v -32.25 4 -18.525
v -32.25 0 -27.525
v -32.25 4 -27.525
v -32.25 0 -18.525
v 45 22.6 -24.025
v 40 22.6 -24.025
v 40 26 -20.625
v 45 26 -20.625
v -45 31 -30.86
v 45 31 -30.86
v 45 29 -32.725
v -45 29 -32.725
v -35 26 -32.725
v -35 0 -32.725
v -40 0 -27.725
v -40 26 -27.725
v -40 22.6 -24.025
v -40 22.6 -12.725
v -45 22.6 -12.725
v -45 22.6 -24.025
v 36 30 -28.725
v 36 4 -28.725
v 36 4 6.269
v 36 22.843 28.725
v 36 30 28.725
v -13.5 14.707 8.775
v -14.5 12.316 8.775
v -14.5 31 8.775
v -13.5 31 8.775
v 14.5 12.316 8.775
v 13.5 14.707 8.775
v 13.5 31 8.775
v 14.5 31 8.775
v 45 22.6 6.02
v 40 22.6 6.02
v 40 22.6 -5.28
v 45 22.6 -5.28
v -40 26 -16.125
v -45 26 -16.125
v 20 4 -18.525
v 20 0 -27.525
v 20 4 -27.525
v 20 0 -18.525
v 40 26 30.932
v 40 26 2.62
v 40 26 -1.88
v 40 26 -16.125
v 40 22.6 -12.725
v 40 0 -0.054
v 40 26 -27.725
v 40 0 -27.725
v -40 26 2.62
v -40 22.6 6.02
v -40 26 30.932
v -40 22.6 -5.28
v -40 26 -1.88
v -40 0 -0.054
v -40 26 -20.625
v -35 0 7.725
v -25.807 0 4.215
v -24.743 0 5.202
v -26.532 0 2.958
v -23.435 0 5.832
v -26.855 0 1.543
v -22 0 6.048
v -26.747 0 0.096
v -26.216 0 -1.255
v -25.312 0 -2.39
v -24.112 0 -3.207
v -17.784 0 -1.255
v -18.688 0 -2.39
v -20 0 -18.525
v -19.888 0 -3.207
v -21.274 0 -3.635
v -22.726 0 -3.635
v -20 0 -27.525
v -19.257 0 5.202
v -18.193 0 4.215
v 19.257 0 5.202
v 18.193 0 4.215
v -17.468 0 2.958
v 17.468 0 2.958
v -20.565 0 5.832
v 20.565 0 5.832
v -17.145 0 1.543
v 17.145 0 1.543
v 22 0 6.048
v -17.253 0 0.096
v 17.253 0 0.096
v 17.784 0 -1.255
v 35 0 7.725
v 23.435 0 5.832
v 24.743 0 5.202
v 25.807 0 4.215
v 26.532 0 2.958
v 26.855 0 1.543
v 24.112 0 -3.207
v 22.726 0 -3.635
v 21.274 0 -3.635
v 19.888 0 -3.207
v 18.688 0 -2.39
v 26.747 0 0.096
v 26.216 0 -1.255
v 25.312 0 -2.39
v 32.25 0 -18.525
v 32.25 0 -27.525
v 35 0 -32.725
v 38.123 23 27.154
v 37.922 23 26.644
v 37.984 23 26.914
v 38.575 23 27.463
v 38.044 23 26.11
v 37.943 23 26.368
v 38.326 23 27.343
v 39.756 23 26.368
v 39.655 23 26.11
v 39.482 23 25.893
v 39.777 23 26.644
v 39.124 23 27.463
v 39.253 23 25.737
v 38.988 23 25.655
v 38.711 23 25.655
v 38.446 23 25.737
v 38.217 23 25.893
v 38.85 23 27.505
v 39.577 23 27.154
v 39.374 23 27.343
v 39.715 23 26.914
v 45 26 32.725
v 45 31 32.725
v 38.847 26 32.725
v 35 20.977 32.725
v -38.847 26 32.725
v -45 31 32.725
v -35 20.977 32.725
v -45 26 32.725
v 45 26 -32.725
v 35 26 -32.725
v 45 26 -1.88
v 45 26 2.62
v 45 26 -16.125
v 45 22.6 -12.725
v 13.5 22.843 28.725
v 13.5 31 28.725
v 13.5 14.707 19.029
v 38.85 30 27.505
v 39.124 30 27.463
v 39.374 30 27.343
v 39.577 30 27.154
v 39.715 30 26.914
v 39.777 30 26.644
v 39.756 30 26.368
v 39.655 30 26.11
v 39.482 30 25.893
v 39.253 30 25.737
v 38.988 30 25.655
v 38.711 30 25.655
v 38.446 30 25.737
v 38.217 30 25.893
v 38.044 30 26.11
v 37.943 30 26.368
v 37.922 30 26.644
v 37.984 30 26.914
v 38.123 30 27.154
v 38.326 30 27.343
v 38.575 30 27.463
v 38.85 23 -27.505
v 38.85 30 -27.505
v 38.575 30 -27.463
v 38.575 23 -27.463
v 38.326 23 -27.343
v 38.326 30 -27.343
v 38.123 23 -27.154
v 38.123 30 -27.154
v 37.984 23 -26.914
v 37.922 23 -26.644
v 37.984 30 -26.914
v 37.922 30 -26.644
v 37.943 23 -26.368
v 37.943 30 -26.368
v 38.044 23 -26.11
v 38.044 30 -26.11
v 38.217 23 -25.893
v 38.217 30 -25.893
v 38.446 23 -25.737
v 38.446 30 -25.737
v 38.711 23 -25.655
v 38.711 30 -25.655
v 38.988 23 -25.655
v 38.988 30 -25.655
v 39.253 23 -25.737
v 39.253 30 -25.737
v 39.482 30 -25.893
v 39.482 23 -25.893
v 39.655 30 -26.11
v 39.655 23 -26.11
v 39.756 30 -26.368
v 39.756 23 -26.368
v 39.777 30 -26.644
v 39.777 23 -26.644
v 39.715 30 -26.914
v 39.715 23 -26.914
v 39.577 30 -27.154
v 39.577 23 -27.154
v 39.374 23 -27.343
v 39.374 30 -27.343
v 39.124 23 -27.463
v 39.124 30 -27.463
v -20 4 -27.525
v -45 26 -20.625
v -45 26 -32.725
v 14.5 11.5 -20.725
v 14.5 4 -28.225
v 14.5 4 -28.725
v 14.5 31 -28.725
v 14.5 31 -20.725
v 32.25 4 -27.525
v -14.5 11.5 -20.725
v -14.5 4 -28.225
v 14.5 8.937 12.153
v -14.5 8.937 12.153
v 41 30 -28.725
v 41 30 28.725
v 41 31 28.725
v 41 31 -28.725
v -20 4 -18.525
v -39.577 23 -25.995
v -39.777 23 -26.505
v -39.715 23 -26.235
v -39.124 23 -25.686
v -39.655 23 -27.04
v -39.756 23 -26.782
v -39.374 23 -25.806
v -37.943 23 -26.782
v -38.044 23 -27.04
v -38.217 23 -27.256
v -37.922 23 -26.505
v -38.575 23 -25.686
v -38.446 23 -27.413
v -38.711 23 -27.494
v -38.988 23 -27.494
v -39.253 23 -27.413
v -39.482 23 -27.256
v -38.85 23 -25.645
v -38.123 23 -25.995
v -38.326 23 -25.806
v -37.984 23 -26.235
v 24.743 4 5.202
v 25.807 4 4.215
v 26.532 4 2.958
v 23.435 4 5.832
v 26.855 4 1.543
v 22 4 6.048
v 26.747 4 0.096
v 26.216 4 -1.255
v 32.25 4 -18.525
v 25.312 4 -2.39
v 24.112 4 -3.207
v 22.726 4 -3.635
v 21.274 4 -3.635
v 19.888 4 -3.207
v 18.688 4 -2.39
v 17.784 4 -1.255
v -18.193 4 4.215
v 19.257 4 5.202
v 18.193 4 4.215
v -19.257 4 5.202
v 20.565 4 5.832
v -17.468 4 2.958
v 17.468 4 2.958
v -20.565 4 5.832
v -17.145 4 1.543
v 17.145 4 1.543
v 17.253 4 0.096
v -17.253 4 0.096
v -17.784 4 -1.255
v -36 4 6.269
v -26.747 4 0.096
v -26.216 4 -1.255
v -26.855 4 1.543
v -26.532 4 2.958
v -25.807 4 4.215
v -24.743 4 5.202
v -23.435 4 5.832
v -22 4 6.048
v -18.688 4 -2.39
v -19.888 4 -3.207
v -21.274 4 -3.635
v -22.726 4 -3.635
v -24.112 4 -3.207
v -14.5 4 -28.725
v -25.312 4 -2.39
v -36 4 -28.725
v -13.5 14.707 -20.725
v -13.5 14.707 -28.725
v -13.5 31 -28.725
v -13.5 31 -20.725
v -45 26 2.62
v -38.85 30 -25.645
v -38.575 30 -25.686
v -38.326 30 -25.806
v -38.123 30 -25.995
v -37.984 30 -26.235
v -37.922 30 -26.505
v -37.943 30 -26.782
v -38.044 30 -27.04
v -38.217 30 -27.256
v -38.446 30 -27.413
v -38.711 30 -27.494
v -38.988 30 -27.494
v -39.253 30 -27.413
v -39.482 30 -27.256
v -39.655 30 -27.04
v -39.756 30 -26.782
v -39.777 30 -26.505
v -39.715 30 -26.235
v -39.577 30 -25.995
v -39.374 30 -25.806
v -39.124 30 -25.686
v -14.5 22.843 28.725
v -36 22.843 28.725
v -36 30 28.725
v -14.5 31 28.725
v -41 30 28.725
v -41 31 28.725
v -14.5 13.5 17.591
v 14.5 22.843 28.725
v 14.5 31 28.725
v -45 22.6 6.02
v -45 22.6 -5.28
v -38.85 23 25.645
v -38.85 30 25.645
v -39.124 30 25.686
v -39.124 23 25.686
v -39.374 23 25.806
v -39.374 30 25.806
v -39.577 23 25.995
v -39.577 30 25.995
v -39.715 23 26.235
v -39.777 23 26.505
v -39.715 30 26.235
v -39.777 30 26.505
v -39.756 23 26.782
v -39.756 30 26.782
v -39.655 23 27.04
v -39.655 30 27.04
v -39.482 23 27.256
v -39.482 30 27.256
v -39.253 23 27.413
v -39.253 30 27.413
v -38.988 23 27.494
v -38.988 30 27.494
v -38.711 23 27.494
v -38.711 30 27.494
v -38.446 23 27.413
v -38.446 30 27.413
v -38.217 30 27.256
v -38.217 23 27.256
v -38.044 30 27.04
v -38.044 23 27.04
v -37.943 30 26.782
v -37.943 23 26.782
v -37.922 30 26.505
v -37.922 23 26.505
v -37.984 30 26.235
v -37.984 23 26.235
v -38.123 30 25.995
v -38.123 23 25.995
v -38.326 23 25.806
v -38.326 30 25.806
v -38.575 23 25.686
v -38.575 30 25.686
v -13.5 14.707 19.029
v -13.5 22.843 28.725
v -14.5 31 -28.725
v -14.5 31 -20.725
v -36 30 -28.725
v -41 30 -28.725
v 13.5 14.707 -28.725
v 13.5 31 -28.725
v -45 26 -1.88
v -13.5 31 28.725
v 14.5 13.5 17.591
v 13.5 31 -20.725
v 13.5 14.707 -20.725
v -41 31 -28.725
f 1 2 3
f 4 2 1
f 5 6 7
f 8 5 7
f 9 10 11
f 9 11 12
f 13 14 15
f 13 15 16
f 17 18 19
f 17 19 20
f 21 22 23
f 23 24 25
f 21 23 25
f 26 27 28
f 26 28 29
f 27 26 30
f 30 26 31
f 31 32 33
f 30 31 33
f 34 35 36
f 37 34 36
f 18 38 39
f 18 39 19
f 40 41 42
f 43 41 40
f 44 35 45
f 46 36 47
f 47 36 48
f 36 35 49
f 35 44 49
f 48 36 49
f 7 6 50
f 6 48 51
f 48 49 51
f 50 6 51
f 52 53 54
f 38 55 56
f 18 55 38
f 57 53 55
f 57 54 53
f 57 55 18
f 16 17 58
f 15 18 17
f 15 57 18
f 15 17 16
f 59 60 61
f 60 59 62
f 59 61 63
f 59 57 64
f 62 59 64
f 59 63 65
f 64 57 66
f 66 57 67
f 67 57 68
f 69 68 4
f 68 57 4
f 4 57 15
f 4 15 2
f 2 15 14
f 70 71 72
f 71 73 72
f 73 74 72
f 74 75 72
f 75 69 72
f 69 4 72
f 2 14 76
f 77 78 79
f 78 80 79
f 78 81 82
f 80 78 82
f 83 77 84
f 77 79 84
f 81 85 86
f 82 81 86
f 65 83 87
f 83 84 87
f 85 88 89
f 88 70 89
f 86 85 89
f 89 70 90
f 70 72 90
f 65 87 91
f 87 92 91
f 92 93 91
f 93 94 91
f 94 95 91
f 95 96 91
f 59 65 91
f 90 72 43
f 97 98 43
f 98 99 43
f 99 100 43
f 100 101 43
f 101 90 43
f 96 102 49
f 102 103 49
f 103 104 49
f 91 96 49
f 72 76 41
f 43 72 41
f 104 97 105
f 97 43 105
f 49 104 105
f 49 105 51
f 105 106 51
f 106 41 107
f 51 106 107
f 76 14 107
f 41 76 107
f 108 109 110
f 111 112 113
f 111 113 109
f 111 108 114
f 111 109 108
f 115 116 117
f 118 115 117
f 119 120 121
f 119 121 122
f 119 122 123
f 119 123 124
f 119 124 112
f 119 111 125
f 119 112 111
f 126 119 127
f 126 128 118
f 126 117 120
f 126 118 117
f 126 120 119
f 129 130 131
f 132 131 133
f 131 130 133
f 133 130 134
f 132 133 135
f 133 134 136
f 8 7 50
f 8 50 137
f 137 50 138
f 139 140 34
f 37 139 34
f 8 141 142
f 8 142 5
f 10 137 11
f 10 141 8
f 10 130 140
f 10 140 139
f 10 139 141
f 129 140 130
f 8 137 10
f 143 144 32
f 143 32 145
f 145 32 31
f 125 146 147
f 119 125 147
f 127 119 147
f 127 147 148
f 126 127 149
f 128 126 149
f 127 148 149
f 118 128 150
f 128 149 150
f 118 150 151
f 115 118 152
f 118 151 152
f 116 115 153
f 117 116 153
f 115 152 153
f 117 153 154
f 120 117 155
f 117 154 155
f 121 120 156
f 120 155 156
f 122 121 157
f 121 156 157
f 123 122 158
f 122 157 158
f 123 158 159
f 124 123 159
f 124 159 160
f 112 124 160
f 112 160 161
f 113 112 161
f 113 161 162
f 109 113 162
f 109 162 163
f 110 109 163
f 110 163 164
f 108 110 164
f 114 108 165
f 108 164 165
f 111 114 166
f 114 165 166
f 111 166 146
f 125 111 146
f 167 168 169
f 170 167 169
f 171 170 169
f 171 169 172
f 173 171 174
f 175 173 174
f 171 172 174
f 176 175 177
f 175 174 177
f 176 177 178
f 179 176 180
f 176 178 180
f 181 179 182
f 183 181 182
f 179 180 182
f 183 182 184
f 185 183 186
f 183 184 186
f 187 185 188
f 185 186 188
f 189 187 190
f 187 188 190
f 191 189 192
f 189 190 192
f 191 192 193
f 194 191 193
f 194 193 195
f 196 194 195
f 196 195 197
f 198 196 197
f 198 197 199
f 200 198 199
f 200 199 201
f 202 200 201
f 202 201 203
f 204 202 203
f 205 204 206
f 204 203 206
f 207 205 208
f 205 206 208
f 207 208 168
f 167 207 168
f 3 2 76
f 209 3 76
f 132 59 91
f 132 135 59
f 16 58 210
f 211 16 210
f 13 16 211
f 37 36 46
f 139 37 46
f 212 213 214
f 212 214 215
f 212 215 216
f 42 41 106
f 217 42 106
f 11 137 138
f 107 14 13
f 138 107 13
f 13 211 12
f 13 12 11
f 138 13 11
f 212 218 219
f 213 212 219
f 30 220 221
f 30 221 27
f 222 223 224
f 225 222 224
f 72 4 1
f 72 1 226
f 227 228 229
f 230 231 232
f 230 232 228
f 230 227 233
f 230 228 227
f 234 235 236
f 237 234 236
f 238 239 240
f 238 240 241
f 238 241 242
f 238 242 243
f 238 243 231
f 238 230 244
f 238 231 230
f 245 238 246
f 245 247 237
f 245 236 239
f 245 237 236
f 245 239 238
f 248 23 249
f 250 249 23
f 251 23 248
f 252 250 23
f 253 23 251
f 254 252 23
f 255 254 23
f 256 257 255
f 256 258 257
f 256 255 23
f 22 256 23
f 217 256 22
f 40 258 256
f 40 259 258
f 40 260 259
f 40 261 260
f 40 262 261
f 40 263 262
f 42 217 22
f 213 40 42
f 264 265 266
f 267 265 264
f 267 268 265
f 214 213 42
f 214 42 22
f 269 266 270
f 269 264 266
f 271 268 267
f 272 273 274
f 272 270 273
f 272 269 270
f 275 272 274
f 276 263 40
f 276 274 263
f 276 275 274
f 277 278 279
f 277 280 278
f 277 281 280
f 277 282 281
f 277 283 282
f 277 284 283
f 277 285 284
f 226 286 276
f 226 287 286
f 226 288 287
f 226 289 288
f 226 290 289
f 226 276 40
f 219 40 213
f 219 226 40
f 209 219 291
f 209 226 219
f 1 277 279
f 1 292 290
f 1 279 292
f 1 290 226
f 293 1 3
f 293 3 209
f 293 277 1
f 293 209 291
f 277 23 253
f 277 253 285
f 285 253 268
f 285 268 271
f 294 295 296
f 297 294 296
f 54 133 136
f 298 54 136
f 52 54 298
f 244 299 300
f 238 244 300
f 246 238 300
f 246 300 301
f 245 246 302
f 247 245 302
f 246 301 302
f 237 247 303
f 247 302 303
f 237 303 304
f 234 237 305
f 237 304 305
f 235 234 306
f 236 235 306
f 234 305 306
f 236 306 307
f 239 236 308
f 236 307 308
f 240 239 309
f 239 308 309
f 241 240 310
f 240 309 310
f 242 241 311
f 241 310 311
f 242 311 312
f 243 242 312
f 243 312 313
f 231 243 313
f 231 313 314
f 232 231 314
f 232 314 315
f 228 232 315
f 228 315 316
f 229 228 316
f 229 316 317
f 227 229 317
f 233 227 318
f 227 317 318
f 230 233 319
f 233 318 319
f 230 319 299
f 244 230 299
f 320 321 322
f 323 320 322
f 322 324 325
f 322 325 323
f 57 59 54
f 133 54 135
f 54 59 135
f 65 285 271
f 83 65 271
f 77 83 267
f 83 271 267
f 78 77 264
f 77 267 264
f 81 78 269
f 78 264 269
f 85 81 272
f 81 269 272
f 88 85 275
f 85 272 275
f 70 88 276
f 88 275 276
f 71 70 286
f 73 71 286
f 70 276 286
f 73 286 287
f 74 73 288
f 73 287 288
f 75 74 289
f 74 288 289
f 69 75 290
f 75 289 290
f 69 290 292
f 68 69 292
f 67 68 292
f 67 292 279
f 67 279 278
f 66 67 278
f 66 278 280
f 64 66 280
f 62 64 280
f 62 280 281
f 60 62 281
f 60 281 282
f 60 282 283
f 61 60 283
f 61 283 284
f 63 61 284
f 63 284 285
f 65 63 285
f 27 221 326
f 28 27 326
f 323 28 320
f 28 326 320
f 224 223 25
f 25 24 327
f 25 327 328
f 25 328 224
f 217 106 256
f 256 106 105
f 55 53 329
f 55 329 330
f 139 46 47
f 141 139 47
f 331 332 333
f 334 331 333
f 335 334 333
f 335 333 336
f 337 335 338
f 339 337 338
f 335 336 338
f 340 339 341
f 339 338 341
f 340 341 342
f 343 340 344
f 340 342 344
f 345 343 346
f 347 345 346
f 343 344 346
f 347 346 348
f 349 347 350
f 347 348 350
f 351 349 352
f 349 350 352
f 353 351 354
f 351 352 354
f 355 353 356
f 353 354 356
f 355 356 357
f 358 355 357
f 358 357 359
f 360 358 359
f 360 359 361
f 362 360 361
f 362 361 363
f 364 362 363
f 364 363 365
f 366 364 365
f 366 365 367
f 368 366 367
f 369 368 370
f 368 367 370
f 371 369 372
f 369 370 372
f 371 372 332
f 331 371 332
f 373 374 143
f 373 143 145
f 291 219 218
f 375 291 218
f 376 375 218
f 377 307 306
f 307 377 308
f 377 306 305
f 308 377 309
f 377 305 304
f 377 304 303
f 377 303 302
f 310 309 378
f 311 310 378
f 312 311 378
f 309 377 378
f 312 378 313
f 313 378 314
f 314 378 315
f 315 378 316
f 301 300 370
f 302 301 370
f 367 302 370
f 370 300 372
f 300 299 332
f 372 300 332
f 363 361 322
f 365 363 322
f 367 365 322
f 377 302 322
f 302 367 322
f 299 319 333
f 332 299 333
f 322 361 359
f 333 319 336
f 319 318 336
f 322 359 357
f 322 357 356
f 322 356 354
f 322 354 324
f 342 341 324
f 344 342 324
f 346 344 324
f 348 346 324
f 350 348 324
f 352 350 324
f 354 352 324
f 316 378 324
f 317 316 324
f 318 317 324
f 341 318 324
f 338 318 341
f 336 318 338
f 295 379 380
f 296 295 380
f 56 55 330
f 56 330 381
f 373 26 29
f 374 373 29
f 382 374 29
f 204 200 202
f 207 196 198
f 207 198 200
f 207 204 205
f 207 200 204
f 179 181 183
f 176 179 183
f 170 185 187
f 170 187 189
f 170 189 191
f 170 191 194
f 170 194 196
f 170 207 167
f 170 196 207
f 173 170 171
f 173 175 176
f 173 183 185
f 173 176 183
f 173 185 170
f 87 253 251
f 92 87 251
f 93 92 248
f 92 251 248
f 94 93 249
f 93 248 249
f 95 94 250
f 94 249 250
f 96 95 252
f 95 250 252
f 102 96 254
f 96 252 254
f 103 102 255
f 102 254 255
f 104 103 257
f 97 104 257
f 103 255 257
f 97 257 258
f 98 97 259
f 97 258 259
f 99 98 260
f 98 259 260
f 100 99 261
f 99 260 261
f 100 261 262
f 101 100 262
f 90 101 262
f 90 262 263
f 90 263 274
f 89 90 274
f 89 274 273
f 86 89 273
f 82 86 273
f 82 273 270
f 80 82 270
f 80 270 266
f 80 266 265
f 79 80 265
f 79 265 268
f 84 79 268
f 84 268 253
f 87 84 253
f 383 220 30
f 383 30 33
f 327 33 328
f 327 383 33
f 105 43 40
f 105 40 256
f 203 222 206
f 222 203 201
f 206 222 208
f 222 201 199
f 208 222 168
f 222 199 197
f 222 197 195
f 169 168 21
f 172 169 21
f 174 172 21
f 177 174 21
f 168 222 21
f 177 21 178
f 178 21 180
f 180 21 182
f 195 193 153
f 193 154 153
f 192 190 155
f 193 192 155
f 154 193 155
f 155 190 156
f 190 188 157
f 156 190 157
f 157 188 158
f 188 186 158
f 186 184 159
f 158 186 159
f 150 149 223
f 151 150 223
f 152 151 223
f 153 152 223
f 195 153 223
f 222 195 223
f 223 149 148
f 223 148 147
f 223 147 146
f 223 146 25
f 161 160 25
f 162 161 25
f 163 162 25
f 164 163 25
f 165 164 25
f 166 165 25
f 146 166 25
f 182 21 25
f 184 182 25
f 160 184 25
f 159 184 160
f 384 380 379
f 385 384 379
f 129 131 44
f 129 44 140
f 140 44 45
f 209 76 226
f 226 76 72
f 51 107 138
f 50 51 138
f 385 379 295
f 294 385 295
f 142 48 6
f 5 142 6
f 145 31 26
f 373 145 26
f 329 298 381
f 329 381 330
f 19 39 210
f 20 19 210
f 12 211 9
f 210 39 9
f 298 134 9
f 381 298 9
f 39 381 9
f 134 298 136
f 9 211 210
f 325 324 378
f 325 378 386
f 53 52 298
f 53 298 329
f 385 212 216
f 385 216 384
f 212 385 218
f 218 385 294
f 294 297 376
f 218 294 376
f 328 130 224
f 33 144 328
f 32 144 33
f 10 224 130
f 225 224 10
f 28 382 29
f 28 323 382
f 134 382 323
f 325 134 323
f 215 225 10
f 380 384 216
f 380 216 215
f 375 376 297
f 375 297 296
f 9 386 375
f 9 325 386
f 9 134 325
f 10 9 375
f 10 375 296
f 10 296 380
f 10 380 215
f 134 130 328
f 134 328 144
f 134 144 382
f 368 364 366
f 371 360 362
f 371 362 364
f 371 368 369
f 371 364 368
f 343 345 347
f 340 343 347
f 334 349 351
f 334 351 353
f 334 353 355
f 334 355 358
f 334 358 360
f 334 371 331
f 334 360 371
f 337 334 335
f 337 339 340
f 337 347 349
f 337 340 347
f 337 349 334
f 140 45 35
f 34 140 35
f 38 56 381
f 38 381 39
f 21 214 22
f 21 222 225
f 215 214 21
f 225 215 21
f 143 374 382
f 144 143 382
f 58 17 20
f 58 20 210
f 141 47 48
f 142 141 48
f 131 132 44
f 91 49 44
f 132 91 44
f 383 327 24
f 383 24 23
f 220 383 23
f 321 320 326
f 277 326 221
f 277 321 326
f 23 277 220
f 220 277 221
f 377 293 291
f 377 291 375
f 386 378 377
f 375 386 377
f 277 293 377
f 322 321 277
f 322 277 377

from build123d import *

# Parameters (mm, degrees)
SKETCH1_W           = 80
SKETCH1_H           = 65.45
BOSS_EXTRUDE1_DEPTH = 31
BOSS_EXTRUDE3_DEPTH = 5
CHAMFER2_SIZE       = 25
CHAMFER2_SIZE2      = 20.977490779
SHELL2_START        = -36
SHELL2_DEPTH        = 72
SHELL2_START_2      = -41
SHELL2_2_OUTLINE_W  = 1
SHELL2_2_OUTLINE_H  = 57.45
SHELL2_2_DEPTH      = 82
SKETCH6_R           = 4.86874318
CUT_EXTRUDE1_DEPTH  = 5
BOSS_EXTRUDE4_DEPTH = 8
BOSS_EXTRUDE5_REACH = 107.939
BOSS_EXTRUDE5_START = 29.5
SKETCH10_W          = 12.25
SKETCH10_H          = 9
CUT_EXTRUDE2_DEPTH  = 6
CHAMFER3_SIZE       = 2
CHAMFER3_SIZE2      = 1.865030172
CHAMFER4_SIZE       = 7.098078142
CHAMFER4_SIZE_2     = 10
CHAMFER5_SIZE       = 10
CHAMFER7_SIZE       = 5
SKETCH11_R          = 0.93
CUT_EXTRUDE3_DEPTH  = 7


# Read off the part's stored shape, not the designer's step: Shell2
with BuildPart() as part:
    # Sketch1 → Boss-Extrude1 (new body)
    with BuildSketch(Plane(origin=(0, 0, 0), x_dir=(1, 0, 0), z_dir=(0, 1, 0))):
        Rectangle(SKETCH1_W, SKETCH1_H)
    extrude(amount=BOSS_EXTRUDE1_DEPTH)

    # Sketch5 → Boss-Extrude3 (add)
    with BuildSketch(Plane.ZY.offset(40)):
        Polygon((-32.725, 31), (-20.625, 31), (8.005, 31), (32.725, 31), (32.725, 26), (2.6203214, 26), (6.0203214, 22.6), (-5.2796786, 22.6), (-1.8796786, 26), (-16.125, 26), (-12.725, 22.6), (-24.025, 22.6), (-20.625, 26), (-32.725, 26), align=None)
    boss_extrude3 = extrude(amount=BOSS_EXTRUDE3_DEPTH)

    # Mirror1: Boss-Extrude3 across plane
    add(boss_extrude3.mirror(Plane(origin=(0, 0, 0), x_dir=(0, 0, 1), z_dir=(1, 0, 0))))

    # Chamfer2
    chamfer2_edges = [part.edges().sort_by_distance(p)[0] for p in [
        (0, 0, 32.725),
    ]]
    chamfer2_side = [part.faces().sort_by_distance(p)[0] for p in [
        (0, 0, 0),
    ]]
    chamfer(chamfer2_edges, length=CHAMFER2_SIZE, length2=CHAMFER2_SIZE2, reference=chamfer2_side[0])

    # Shell2 outline → Shell2 (cut)
    with BuildSketch(Plane.YZ.offset(SHELL2_START)):
        Polygon((22.842721412, 28.725), (4, 6.269119063), (4, -28.725), (31, -28.725), (31, 28.725), align=None)
    extrude(amount=SHELL2_DEPTH, mode=Mode.SUBTRACT)

    # Shell2 2 outline → Shell2 2 (cut)
    with BuildSketch(Plane.YZ.offset(SHELL2_START_2)):
        with Locations((30.5, 0)):
            Rectangle(SHELL2_2_OUTLINE_W, SHELL2_2_OUTLINE_H)
    extrude(amount=SHELL2_2_DEPTH, mode=Mode.SUBTRACT)

    # Sketch6 → Cut-Extrude1 (cut)
    with BuildSketch(Plane(origin=(0, 4, 24.632603001), x_dir=(1, 0, 0), z_dir=(0, 1, 0))):
        with Locations(Location((22, 23.453346141, 0), (0, 0, 270))):
            Circle(SKETCH6_R)
        with Locations(Location((-22, 23.453346141, 0), (0, 0, 270))):
            Circle(SKETCH6_R)
    extrude(amount=-CUT_EXTRUDE1_DEPTH, mode=Mode.SUBTRACT)

    # Sketch7 → Boss-Extrude4 (add)
    with BuildSketch(Plane.XY.offset(-28.725)):
        Polygon((-14.5, 13.5), (14.5, 13.5), (14.5, 31), (13.5, 31), (13.5, 14.706896552), (-13.5, 14.706896552), (-13.5, 31), (-14.5, 31), align=None)
    extrude(amount=BOSS_EXTRUDE4_DEPTH)

    # Sketch8 → Boss-Extrude5 (add, up to next)
    with BuildSketch(Plane.XY.offset(-20.725).offset(BOSS_EXTRUDE5_START), mode=Mode.PRIVATE) as boss_extrude5_sk1:
        Polygon((-13.5, 14.706896552), (-13.5, 31), (-14.5, 31), (-14.5, 14.706896552), (-14.5, 13.5), (-13.5, 13.5), (13.5, 13.5), (14.5, 13.5), (14.5, 14.706896552), (14.5, 31), (13.5, 31), (13.5, 14.706896552), align=None)
    boss_extrude5_tool1 = extrude(boss_extrude5_sk1.sketch, amount=BOSS_EXTRUDE5_REACH, mode=Mode.PRIVATE) - part.part
    add(boss_extrude5_tool1.solids().sort_by_distance((14, 30.661289, 8.775))[0])

    # Sketch10 → Cut-Extrude2 (cut)
    with BuildSketch(Plane.XZ):
        with Locations((-26.125, -23.025)):
            Rectangle(SKETCH10_W, SKETCH10_H)
        with Locations((26.125, -23.025)):
            Rectangle(SKETCH10_W, SKETCH10_H)
    extrude(amount=-CUT_EXTRUDE2_DEPTH, mode=Mode.SUBTRACT)

    # Chamfer3
    chamfer3_edges = [part.edges().sort_by_distance(p)[0] for p in [
        (0, 31, -32.725),
    ]]
    chamfer3_side = [part.faces().sort_by_distance(p)[0] for p in [
        (0, 15.756916996, -32.725),
    ]]
    chamfer(chamfer3_edges, length=CHAMFER3_SIZE, length2=CHAMFER3_SIZE2, reference=chamfer3_side[0])

    # Chamfer4
    # the kernel refuses this chamfer: 10, 7.098078142 mm, written as the material it adds along each edge
    with BuildSketch(Plane(origin=(14.5, 13.5, 17.590778193), x_dir=(0, -0.6849156240265527, -0.728622390518105), z_dir=(-1, 0, 0))) as chamfer4_piece_1_section:
        Polygon((CHAMFER4_SIZE * 0.998412410217, -CHAMFER4_SIZE * 0.0563263630269), (CHAMFER4_SIZE_2 * 0.728622390518, -CHAMFER4_SIZE_2 * 0.684915624027), (0, 0), align=None)
    chamfer4_piece_1 = extrude(amount=29, mode=Mode.PRIVATE)
    chamfer4_piece_1 = split(chamfer4_piece_1, bisect_by=Plane(origin=(0, 11.943437141, 8.775), z_dir=(0, 0, 1)), keep=Keep.TOP, mode=Mode.PRIVATE)
    add(chamfer4_piece_1)

    # Chamfer5
    # the kernel refuses this chamfer: 10 mm, written as the material it adds along each edge
    with BuildSketch(Plane(origin=(-14.5, 13.5, -28.725), x_dir=(0, 0.027495876610586317, 0.9996219169112968), z_dir=(1, 0, 0))) as chamfer5_piece_1_section:
        Polygon((CHAMFER5_SIZE * 0.999621916911, CHAMFER5_SIZE * 0.0274958766106), (-CHAMFER5_SIZE * 0.0274958766106, CHAMFER5_SIZE * 0.999621916911), (0, 0), align=None)
    chamfer5_piece_1 = extrude(amount=29, mode=Mode.PRIVATE)
    chamfer5_piece_1 = split(chamfer5_piece_1, bisect_by=Plane(origin=(0, 10.042815877, -20.725), z_dir=(0, 0, -1)), keep=Keep.TOP, mode=Mode.PRIVATE)
    add(chamfer5_piece_1)

    # Chamfer7
    chamfer7_edges = [part.edges().sort_by_distance(p)[0] for p in [
        (40, 10.48874539, 20.225),
        (-40, 10.48874539, 20.225),
        (-40, 13, -32.725),
        (40, 13, -32.725),
    ]]
    chamfer(chamfer7_edges, length=CHAMFER7_SIZE)

    # Sketch11 → Cut-Extrude3 (cut)
    with BuildSketch(Plane(origin=(0, 30, 0), x_dir=(1, 0, 0), z_dir=(0, 1, 0))):
        with Locations(Location((38.849613738, -26.574613738, 0), (0, 0, 270))):
            Circle(SKETCH11_R)
        with Locations(Location((38.849613738, 26.574613738, 0), (0, 0, 90))):
            Circle(SKETCH11_R)
        with Locations(Location((-38.849613738, 26.574613738, 0), (0, 0, 270))):
            Circle(SKETCH11_R)
        with Locations(Location((-38.849613738, -26.574613738, 0), (0, 0, 90))):
            Circle(SKETCH11_R)
    extrude(amount=-CUT_EXTRUDE3_DEPTH, mode=Mode.SUBTRACT)


solid = part.part
